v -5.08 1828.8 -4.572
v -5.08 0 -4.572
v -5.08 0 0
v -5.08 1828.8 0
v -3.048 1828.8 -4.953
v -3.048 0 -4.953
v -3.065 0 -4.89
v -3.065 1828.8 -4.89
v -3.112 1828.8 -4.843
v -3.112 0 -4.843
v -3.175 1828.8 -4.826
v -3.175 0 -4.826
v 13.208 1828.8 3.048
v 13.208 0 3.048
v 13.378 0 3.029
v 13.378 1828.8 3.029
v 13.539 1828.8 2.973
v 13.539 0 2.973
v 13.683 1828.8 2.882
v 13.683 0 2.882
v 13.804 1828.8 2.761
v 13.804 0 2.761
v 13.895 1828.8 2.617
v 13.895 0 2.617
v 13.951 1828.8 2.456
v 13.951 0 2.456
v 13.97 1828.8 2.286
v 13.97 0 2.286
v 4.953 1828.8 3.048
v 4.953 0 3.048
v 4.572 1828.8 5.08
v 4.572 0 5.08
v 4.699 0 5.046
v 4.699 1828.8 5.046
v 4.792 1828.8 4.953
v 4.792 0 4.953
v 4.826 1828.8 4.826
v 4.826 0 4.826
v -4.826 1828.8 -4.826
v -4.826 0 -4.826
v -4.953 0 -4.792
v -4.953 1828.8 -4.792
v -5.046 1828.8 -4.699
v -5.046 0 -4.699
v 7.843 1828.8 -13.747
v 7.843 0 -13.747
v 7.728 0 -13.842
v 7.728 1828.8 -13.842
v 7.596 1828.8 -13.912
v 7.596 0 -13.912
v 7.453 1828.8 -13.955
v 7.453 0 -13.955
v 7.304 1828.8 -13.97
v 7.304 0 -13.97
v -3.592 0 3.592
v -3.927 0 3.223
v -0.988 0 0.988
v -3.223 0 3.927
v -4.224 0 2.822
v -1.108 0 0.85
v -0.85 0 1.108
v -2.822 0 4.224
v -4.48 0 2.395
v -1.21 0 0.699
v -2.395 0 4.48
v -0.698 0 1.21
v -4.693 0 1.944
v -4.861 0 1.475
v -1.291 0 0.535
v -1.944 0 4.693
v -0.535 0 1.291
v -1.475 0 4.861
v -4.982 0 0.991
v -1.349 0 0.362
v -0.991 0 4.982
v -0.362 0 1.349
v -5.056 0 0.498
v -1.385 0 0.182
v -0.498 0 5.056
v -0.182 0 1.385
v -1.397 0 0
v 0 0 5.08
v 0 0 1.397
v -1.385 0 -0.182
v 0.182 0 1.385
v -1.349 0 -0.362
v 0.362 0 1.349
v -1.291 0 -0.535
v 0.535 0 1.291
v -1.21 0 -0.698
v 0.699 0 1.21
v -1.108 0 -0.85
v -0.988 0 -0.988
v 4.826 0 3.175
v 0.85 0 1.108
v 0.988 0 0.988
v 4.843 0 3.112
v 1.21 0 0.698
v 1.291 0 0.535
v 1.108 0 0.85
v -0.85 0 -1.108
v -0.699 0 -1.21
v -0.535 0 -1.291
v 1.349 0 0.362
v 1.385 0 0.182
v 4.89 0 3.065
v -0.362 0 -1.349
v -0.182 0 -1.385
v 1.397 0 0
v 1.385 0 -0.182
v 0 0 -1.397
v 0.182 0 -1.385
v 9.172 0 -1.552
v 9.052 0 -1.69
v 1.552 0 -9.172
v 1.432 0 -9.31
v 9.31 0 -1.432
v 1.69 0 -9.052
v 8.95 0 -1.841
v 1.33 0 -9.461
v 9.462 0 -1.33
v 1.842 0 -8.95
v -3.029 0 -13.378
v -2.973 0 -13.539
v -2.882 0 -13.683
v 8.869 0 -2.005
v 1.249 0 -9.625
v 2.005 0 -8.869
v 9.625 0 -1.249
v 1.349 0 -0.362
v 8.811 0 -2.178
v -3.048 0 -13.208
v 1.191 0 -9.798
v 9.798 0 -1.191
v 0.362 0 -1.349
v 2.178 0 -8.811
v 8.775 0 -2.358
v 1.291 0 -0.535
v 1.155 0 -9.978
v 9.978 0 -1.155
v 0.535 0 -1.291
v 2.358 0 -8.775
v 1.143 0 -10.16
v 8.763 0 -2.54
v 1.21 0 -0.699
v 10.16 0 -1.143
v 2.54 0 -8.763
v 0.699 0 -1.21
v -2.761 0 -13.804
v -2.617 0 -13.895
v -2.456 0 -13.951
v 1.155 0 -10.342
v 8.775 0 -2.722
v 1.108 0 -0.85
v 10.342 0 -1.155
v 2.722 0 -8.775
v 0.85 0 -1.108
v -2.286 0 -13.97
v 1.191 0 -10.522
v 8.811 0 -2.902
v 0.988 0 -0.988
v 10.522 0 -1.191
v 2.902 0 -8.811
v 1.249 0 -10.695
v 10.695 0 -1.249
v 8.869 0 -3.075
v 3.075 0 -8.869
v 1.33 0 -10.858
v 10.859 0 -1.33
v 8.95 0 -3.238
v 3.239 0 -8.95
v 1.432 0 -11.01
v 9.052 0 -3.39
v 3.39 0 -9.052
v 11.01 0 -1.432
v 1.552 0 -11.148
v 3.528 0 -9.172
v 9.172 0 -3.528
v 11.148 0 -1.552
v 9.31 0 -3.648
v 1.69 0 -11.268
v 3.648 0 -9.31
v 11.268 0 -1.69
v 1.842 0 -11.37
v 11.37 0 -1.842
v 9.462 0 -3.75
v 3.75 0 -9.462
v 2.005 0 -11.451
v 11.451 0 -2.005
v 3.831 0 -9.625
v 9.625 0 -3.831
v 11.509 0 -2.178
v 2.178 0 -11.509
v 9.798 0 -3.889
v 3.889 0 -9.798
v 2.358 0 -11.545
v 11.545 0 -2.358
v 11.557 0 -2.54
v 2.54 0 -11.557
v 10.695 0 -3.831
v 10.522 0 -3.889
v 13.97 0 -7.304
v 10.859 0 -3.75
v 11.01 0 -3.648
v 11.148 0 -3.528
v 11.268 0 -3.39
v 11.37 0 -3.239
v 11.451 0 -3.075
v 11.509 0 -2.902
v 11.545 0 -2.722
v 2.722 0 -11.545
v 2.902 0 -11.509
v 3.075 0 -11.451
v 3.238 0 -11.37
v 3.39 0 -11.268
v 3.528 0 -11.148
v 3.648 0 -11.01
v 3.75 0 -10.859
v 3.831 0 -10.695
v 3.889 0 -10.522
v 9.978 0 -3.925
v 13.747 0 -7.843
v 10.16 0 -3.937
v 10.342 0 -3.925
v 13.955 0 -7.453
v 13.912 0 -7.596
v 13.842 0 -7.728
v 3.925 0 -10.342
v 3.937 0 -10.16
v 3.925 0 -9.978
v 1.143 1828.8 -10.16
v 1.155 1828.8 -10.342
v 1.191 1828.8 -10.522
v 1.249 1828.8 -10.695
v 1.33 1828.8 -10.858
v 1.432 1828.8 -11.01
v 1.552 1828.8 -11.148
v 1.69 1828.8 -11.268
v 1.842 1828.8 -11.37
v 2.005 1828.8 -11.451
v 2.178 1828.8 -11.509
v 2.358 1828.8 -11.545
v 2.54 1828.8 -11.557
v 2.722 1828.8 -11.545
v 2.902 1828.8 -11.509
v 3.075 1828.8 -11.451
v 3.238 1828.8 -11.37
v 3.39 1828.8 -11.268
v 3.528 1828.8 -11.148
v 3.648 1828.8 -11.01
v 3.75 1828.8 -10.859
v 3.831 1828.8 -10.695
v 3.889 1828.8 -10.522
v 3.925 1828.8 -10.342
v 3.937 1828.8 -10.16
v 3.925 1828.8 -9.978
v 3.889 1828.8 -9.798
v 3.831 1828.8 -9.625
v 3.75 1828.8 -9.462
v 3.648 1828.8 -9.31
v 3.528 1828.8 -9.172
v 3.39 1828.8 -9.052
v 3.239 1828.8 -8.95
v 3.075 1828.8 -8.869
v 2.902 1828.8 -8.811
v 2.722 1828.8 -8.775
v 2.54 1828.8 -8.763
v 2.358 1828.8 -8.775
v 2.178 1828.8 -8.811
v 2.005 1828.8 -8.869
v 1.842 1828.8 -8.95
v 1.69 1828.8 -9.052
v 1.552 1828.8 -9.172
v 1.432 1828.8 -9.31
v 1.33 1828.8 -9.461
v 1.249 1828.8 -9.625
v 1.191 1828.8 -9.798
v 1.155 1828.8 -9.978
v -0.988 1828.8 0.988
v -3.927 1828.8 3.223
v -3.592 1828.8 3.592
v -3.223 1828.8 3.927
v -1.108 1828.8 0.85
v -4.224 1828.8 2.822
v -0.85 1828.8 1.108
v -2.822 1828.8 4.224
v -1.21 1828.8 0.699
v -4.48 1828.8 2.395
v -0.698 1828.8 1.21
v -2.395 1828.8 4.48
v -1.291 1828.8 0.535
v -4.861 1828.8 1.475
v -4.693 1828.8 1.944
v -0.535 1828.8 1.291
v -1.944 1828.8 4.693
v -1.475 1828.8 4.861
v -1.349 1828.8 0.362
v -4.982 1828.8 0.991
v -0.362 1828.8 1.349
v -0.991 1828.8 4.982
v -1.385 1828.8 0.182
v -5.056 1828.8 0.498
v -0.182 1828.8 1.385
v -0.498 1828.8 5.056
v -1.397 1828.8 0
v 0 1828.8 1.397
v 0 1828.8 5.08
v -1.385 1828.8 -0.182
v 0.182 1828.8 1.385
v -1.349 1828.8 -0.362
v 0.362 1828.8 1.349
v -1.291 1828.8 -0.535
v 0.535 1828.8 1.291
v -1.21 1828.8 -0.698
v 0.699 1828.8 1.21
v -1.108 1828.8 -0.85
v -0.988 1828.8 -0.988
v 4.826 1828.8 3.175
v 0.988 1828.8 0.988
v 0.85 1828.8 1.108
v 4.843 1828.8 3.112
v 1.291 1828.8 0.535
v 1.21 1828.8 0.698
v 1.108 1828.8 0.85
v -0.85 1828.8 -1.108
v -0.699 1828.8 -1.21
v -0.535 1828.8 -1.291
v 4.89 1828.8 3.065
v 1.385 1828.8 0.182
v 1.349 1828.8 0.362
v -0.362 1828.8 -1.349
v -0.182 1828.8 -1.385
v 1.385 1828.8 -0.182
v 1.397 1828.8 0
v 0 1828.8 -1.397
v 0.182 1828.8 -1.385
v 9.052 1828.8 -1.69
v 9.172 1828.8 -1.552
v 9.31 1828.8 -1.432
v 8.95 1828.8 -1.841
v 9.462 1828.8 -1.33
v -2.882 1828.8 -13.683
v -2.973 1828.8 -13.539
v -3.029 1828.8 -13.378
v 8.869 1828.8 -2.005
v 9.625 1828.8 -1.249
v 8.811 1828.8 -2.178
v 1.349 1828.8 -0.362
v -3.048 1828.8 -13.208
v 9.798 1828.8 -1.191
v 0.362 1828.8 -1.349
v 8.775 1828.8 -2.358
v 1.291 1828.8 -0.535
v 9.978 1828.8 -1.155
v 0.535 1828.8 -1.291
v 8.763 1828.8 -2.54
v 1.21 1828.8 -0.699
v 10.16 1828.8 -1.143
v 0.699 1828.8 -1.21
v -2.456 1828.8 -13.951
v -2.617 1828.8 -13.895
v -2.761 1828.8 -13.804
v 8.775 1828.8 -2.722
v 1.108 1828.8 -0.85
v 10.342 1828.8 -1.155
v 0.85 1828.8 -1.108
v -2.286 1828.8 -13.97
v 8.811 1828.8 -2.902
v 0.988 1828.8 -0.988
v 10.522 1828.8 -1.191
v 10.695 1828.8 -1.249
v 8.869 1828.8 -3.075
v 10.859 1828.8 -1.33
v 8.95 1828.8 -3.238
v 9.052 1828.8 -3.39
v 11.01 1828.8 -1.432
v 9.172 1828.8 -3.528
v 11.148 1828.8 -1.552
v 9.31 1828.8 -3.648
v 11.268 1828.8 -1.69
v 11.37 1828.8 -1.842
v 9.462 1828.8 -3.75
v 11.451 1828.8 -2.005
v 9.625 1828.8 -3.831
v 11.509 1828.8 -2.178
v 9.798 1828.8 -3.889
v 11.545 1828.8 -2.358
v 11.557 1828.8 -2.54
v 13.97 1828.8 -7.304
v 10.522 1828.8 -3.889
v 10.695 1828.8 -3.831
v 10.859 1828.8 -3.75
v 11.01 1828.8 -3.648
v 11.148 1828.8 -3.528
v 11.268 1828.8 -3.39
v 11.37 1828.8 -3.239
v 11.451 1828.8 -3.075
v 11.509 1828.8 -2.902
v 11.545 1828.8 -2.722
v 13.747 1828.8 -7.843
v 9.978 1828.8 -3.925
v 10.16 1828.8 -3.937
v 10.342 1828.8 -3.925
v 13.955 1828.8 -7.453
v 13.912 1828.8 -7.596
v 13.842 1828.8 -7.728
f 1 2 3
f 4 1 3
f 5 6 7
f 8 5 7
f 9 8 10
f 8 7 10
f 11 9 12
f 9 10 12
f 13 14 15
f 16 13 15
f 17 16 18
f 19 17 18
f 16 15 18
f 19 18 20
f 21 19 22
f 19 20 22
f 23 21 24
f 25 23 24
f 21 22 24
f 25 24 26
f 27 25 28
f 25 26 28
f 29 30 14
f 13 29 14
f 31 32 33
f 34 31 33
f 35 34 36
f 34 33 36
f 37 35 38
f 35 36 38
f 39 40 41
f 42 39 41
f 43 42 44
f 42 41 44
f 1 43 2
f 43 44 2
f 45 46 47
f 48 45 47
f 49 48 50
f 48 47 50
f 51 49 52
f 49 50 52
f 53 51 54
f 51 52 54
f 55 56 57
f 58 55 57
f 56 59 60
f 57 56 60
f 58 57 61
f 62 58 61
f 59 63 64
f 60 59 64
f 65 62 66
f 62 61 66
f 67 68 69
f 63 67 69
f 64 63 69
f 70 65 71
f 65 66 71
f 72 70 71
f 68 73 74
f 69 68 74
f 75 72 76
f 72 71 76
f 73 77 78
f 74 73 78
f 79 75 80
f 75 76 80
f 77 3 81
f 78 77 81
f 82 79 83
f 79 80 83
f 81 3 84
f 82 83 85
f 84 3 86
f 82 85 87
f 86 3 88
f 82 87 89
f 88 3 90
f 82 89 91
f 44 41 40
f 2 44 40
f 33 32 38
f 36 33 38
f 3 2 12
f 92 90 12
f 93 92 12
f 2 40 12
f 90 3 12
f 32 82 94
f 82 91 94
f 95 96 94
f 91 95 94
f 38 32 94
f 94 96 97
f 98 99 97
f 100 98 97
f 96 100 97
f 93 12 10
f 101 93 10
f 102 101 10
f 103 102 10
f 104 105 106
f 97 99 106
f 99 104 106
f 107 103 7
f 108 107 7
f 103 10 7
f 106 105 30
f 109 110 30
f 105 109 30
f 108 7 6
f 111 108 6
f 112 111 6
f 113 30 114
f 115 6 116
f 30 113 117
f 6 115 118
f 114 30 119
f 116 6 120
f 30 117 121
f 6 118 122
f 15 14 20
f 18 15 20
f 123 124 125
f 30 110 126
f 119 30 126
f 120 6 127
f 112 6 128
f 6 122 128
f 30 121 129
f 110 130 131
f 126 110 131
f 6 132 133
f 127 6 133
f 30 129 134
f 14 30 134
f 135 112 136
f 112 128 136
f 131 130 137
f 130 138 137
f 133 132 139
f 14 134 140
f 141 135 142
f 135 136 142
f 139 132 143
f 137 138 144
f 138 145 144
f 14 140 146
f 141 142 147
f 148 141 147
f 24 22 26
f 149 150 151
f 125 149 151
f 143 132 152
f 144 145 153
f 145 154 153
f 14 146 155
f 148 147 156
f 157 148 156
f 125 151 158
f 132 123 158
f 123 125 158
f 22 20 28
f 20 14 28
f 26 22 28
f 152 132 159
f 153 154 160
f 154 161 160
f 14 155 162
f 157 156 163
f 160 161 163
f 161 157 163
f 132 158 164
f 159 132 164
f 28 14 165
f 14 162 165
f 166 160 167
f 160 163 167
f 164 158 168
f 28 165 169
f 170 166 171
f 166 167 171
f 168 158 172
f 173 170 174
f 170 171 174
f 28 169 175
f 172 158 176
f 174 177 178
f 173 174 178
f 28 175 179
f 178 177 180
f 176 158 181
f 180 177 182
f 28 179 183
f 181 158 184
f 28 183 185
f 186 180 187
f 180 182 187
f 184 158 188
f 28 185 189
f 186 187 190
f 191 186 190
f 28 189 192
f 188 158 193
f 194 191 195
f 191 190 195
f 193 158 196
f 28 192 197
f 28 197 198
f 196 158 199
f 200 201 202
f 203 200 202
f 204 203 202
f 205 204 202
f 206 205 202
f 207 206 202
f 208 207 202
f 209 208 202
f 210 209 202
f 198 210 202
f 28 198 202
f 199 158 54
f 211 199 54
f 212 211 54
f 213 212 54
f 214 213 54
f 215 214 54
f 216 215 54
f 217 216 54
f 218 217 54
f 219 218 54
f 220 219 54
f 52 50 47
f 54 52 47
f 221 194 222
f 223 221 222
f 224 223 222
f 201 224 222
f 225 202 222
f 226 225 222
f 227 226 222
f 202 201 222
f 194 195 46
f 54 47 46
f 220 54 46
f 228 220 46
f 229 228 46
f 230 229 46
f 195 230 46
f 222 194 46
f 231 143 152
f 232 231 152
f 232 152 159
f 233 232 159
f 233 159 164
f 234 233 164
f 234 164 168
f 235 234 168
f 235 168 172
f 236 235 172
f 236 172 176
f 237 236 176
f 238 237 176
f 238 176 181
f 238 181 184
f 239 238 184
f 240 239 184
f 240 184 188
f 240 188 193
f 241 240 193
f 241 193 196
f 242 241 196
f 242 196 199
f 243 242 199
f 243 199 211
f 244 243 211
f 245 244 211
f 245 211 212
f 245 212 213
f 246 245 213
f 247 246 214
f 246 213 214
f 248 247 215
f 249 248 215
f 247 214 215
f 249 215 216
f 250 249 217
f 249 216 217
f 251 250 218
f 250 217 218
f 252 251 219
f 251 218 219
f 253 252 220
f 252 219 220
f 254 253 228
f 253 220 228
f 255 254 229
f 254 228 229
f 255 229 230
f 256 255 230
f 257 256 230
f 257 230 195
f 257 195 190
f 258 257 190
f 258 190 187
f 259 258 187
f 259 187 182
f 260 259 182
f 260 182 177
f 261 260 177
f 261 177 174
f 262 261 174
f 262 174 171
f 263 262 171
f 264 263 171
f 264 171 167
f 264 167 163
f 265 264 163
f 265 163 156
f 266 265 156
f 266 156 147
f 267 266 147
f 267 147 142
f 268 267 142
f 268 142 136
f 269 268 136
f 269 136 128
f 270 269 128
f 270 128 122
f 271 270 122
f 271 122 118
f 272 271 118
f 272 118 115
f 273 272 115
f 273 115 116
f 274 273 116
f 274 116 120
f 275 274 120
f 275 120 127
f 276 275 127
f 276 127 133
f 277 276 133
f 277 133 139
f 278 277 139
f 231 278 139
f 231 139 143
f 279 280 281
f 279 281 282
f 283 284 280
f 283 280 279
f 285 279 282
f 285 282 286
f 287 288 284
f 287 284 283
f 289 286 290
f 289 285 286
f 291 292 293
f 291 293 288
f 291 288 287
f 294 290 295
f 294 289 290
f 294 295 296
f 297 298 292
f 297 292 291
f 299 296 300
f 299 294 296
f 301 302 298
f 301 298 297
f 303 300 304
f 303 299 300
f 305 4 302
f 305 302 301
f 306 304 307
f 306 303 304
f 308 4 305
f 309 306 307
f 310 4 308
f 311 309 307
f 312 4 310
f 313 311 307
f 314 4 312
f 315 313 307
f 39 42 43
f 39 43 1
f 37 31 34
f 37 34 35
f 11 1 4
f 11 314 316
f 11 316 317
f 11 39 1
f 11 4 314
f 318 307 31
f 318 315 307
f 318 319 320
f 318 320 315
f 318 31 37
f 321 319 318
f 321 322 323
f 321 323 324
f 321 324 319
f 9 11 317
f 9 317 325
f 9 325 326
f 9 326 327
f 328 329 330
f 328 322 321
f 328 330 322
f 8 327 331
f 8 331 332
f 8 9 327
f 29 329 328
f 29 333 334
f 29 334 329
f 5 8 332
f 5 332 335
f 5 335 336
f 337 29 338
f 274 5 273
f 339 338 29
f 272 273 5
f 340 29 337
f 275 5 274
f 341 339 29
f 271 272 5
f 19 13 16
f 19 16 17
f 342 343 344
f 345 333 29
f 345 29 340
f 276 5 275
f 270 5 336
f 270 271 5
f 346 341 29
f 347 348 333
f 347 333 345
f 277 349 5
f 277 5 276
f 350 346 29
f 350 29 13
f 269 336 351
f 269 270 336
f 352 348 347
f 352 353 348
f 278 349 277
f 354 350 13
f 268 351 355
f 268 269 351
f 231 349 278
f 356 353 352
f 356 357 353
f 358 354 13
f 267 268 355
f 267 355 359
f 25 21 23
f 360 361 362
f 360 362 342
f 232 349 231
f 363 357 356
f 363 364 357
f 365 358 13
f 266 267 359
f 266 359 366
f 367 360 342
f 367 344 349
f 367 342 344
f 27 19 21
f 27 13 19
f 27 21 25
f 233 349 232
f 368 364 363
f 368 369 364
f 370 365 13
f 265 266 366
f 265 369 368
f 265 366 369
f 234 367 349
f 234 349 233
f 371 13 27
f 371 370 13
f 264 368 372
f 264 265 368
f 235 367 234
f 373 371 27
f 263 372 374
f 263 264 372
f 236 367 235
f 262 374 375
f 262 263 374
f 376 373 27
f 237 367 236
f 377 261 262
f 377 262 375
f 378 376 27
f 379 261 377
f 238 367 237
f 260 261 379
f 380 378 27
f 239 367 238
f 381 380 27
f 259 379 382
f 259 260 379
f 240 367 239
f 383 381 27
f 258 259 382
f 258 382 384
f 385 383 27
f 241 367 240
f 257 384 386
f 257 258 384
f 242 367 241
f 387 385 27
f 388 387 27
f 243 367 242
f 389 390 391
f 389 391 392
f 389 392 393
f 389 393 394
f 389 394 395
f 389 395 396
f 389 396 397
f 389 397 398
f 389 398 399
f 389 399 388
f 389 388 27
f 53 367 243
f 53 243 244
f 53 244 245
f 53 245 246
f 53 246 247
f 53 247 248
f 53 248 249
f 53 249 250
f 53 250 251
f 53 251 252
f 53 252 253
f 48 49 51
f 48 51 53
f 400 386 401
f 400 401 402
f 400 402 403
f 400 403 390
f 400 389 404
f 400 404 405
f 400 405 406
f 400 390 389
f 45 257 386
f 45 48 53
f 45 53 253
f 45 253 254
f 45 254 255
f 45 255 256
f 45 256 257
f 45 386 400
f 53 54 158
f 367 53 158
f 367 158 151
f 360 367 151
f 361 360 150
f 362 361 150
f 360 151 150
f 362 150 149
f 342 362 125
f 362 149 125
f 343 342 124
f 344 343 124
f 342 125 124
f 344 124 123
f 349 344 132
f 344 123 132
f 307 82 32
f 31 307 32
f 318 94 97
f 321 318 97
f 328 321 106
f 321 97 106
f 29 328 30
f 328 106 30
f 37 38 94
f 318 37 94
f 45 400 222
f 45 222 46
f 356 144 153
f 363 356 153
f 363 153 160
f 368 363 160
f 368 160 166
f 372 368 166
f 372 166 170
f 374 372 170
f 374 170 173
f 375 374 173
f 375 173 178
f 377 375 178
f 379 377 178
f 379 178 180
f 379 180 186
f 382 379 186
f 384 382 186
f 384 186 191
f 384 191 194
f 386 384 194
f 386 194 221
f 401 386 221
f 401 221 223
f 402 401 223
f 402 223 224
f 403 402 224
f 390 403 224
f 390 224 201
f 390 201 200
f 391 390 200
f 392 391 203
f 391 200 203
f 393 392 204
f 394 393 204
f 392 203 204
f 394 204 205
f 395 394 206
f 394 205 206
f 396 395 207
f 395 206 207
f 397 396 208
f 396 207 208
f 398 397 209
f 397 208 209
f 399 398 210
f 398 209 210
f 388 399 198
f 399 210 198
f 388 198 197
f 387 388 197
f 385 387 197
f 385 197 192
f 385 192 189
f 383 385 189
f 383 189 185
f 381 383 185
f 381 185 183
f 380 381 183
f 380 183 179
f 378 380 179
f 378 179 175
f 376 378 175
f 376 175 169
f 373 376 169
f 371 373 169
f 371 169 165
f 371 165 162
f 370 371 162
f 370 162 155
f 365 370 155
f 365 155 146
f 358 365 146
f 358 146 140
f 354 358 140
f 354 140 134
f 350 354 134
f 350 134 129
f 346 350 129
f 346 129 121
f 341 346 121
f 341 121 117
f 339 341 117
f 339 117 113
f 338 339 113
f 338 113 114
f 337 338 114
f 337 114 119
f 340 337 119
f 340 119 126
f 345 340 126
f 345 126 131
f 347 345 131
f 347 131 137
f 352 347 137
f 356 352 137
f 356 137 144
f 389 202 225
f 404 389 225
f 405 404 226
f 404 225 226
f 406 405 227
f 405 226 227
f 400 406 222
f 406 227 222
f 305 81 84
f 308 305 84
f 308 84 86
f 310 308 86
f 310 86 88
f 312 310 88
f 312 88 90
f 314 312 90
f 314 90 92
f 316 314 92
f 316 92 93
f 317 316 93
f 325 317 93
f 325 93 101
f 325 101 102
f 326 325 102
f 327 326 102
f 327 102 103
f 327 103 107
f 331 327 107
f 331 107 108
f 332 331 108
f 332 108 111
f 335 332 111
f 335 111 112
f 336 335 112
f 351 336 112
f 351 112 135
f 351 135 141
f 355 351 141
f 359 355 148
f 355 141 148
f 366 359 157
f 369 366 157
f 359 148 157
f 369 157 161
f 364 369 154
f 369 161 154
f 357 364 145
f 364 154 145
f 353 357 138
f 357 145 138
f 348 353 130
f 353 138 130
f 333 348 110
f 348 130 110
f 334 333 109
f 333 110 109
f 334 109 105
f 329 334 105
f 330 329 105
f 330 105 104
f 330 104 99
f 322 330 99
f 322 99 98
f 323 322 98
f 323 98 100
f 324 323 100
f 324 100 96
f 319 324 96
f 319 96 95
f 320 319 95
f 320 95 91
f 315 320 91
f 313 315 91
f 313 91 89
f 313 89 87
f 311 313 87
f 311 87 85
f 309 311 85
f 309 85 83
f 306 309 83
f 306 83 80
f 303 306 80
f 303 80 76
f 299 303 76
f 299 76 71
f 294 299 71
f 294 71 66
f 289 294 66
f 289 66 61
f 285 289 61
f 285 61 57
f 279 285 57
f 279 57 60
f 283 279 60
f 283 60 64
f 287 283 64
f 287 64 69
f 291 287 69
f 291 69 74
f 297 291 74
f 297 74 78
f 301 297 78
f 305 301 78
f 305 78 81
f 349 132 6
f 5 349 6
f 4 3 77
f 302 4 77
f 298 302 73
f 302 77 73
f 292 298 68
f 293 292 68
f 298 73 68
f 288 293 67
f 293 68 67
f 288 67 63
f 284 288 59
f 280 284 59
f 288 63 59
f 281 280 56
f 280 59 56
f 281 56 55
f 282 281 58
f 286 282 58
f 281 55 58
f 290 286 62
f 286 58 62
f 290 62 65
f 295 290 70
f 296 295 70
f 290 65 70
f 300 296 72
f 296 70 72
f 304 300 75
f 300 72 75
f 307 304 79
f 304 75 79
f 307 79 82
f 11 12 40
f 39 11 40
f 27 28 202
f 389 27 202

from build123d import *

# Parameters (mm, degrees)
BOSS_EXTRUDE1_DEPTH = 1828.8
THRU_HOLES_D        = 2.794


with BuildPart() as part:
    # Sketch1 → Boss-Extrude1 (new body)
    with BuildSketch(Plane(origin=(0, 0, 0), x_dir=(1, 0, 0), z_dir=(0, 1, 0))):
        with BuildLine():
            Line((-3.048, 13.208), (-3.048, 4.953))
            ThreePointArc((-3.048, 4.953), (-3.085197439, 4.863197439), (-3.175, 4.826))
            Line((-3.175, 4.826), (-4.826, 4.826))
            ThreePointArc((-4.826, 4.826), (-5.005605122, 4.751605122), (-5.08, 4.572))
            Line((-5.08, 4.572), (-5.08, 0))
            ThreePointArc((-5.08, 0), (-3.592102448, -3.592102448), (0, -5.08))
            Line((0, -5.08), (4.572, -5.08))
            ThreePointArc((4.572, -5.08), (4.751605122, -5.005605122), (4.826, -4.826))
            Line((4.826, -4.826), (4.826, -3.175))
            ThreePointArc((4.826, -3.175), (4.863197439, -3.085197439), (4.953, -3.048))
            Line((4.953, -3.048), (13.208, -3.048))
            ThreePointArc((13.208, -3.048), (13.746815367, -2.824815367), (13.97, -2.286))
            Line((13.97, -2.286), (13.97, 7.304369265))
            ThreePointArc((13.97, 7.304369265), (13.911996204, 7.595974041), (13.746815367, 7.843184633))
            Line((13.746815367, 7.843184633), (7.843184633, 13.746815367))
            ThreePointArc((7.843184633, 13.746815367), (7.595974041, 13.911996204), (7.304369265, 13.97))
            Line((7.304369265, 13.97), (-2.286, 13.97))
            ThreePointArc((-2.286, 13.97), (-2.824815367, 13.746815367), (-3.048, 13.208))
        make_face()
    extrude(amount=BOSS_EXTRUDE1_DEPTH)

    # THRU HOLES (through all)
    with Locations(Plane(origin=(0, 1828.8, 0), x_dir=(1, 0, 0), z_dir=(0, 1, 0))):
        with Locations((0, 0), (2.54, 10.16), (10.16, 2.54)):
            Hole(THRU_HOLES_D / 2)


solid = part.part
